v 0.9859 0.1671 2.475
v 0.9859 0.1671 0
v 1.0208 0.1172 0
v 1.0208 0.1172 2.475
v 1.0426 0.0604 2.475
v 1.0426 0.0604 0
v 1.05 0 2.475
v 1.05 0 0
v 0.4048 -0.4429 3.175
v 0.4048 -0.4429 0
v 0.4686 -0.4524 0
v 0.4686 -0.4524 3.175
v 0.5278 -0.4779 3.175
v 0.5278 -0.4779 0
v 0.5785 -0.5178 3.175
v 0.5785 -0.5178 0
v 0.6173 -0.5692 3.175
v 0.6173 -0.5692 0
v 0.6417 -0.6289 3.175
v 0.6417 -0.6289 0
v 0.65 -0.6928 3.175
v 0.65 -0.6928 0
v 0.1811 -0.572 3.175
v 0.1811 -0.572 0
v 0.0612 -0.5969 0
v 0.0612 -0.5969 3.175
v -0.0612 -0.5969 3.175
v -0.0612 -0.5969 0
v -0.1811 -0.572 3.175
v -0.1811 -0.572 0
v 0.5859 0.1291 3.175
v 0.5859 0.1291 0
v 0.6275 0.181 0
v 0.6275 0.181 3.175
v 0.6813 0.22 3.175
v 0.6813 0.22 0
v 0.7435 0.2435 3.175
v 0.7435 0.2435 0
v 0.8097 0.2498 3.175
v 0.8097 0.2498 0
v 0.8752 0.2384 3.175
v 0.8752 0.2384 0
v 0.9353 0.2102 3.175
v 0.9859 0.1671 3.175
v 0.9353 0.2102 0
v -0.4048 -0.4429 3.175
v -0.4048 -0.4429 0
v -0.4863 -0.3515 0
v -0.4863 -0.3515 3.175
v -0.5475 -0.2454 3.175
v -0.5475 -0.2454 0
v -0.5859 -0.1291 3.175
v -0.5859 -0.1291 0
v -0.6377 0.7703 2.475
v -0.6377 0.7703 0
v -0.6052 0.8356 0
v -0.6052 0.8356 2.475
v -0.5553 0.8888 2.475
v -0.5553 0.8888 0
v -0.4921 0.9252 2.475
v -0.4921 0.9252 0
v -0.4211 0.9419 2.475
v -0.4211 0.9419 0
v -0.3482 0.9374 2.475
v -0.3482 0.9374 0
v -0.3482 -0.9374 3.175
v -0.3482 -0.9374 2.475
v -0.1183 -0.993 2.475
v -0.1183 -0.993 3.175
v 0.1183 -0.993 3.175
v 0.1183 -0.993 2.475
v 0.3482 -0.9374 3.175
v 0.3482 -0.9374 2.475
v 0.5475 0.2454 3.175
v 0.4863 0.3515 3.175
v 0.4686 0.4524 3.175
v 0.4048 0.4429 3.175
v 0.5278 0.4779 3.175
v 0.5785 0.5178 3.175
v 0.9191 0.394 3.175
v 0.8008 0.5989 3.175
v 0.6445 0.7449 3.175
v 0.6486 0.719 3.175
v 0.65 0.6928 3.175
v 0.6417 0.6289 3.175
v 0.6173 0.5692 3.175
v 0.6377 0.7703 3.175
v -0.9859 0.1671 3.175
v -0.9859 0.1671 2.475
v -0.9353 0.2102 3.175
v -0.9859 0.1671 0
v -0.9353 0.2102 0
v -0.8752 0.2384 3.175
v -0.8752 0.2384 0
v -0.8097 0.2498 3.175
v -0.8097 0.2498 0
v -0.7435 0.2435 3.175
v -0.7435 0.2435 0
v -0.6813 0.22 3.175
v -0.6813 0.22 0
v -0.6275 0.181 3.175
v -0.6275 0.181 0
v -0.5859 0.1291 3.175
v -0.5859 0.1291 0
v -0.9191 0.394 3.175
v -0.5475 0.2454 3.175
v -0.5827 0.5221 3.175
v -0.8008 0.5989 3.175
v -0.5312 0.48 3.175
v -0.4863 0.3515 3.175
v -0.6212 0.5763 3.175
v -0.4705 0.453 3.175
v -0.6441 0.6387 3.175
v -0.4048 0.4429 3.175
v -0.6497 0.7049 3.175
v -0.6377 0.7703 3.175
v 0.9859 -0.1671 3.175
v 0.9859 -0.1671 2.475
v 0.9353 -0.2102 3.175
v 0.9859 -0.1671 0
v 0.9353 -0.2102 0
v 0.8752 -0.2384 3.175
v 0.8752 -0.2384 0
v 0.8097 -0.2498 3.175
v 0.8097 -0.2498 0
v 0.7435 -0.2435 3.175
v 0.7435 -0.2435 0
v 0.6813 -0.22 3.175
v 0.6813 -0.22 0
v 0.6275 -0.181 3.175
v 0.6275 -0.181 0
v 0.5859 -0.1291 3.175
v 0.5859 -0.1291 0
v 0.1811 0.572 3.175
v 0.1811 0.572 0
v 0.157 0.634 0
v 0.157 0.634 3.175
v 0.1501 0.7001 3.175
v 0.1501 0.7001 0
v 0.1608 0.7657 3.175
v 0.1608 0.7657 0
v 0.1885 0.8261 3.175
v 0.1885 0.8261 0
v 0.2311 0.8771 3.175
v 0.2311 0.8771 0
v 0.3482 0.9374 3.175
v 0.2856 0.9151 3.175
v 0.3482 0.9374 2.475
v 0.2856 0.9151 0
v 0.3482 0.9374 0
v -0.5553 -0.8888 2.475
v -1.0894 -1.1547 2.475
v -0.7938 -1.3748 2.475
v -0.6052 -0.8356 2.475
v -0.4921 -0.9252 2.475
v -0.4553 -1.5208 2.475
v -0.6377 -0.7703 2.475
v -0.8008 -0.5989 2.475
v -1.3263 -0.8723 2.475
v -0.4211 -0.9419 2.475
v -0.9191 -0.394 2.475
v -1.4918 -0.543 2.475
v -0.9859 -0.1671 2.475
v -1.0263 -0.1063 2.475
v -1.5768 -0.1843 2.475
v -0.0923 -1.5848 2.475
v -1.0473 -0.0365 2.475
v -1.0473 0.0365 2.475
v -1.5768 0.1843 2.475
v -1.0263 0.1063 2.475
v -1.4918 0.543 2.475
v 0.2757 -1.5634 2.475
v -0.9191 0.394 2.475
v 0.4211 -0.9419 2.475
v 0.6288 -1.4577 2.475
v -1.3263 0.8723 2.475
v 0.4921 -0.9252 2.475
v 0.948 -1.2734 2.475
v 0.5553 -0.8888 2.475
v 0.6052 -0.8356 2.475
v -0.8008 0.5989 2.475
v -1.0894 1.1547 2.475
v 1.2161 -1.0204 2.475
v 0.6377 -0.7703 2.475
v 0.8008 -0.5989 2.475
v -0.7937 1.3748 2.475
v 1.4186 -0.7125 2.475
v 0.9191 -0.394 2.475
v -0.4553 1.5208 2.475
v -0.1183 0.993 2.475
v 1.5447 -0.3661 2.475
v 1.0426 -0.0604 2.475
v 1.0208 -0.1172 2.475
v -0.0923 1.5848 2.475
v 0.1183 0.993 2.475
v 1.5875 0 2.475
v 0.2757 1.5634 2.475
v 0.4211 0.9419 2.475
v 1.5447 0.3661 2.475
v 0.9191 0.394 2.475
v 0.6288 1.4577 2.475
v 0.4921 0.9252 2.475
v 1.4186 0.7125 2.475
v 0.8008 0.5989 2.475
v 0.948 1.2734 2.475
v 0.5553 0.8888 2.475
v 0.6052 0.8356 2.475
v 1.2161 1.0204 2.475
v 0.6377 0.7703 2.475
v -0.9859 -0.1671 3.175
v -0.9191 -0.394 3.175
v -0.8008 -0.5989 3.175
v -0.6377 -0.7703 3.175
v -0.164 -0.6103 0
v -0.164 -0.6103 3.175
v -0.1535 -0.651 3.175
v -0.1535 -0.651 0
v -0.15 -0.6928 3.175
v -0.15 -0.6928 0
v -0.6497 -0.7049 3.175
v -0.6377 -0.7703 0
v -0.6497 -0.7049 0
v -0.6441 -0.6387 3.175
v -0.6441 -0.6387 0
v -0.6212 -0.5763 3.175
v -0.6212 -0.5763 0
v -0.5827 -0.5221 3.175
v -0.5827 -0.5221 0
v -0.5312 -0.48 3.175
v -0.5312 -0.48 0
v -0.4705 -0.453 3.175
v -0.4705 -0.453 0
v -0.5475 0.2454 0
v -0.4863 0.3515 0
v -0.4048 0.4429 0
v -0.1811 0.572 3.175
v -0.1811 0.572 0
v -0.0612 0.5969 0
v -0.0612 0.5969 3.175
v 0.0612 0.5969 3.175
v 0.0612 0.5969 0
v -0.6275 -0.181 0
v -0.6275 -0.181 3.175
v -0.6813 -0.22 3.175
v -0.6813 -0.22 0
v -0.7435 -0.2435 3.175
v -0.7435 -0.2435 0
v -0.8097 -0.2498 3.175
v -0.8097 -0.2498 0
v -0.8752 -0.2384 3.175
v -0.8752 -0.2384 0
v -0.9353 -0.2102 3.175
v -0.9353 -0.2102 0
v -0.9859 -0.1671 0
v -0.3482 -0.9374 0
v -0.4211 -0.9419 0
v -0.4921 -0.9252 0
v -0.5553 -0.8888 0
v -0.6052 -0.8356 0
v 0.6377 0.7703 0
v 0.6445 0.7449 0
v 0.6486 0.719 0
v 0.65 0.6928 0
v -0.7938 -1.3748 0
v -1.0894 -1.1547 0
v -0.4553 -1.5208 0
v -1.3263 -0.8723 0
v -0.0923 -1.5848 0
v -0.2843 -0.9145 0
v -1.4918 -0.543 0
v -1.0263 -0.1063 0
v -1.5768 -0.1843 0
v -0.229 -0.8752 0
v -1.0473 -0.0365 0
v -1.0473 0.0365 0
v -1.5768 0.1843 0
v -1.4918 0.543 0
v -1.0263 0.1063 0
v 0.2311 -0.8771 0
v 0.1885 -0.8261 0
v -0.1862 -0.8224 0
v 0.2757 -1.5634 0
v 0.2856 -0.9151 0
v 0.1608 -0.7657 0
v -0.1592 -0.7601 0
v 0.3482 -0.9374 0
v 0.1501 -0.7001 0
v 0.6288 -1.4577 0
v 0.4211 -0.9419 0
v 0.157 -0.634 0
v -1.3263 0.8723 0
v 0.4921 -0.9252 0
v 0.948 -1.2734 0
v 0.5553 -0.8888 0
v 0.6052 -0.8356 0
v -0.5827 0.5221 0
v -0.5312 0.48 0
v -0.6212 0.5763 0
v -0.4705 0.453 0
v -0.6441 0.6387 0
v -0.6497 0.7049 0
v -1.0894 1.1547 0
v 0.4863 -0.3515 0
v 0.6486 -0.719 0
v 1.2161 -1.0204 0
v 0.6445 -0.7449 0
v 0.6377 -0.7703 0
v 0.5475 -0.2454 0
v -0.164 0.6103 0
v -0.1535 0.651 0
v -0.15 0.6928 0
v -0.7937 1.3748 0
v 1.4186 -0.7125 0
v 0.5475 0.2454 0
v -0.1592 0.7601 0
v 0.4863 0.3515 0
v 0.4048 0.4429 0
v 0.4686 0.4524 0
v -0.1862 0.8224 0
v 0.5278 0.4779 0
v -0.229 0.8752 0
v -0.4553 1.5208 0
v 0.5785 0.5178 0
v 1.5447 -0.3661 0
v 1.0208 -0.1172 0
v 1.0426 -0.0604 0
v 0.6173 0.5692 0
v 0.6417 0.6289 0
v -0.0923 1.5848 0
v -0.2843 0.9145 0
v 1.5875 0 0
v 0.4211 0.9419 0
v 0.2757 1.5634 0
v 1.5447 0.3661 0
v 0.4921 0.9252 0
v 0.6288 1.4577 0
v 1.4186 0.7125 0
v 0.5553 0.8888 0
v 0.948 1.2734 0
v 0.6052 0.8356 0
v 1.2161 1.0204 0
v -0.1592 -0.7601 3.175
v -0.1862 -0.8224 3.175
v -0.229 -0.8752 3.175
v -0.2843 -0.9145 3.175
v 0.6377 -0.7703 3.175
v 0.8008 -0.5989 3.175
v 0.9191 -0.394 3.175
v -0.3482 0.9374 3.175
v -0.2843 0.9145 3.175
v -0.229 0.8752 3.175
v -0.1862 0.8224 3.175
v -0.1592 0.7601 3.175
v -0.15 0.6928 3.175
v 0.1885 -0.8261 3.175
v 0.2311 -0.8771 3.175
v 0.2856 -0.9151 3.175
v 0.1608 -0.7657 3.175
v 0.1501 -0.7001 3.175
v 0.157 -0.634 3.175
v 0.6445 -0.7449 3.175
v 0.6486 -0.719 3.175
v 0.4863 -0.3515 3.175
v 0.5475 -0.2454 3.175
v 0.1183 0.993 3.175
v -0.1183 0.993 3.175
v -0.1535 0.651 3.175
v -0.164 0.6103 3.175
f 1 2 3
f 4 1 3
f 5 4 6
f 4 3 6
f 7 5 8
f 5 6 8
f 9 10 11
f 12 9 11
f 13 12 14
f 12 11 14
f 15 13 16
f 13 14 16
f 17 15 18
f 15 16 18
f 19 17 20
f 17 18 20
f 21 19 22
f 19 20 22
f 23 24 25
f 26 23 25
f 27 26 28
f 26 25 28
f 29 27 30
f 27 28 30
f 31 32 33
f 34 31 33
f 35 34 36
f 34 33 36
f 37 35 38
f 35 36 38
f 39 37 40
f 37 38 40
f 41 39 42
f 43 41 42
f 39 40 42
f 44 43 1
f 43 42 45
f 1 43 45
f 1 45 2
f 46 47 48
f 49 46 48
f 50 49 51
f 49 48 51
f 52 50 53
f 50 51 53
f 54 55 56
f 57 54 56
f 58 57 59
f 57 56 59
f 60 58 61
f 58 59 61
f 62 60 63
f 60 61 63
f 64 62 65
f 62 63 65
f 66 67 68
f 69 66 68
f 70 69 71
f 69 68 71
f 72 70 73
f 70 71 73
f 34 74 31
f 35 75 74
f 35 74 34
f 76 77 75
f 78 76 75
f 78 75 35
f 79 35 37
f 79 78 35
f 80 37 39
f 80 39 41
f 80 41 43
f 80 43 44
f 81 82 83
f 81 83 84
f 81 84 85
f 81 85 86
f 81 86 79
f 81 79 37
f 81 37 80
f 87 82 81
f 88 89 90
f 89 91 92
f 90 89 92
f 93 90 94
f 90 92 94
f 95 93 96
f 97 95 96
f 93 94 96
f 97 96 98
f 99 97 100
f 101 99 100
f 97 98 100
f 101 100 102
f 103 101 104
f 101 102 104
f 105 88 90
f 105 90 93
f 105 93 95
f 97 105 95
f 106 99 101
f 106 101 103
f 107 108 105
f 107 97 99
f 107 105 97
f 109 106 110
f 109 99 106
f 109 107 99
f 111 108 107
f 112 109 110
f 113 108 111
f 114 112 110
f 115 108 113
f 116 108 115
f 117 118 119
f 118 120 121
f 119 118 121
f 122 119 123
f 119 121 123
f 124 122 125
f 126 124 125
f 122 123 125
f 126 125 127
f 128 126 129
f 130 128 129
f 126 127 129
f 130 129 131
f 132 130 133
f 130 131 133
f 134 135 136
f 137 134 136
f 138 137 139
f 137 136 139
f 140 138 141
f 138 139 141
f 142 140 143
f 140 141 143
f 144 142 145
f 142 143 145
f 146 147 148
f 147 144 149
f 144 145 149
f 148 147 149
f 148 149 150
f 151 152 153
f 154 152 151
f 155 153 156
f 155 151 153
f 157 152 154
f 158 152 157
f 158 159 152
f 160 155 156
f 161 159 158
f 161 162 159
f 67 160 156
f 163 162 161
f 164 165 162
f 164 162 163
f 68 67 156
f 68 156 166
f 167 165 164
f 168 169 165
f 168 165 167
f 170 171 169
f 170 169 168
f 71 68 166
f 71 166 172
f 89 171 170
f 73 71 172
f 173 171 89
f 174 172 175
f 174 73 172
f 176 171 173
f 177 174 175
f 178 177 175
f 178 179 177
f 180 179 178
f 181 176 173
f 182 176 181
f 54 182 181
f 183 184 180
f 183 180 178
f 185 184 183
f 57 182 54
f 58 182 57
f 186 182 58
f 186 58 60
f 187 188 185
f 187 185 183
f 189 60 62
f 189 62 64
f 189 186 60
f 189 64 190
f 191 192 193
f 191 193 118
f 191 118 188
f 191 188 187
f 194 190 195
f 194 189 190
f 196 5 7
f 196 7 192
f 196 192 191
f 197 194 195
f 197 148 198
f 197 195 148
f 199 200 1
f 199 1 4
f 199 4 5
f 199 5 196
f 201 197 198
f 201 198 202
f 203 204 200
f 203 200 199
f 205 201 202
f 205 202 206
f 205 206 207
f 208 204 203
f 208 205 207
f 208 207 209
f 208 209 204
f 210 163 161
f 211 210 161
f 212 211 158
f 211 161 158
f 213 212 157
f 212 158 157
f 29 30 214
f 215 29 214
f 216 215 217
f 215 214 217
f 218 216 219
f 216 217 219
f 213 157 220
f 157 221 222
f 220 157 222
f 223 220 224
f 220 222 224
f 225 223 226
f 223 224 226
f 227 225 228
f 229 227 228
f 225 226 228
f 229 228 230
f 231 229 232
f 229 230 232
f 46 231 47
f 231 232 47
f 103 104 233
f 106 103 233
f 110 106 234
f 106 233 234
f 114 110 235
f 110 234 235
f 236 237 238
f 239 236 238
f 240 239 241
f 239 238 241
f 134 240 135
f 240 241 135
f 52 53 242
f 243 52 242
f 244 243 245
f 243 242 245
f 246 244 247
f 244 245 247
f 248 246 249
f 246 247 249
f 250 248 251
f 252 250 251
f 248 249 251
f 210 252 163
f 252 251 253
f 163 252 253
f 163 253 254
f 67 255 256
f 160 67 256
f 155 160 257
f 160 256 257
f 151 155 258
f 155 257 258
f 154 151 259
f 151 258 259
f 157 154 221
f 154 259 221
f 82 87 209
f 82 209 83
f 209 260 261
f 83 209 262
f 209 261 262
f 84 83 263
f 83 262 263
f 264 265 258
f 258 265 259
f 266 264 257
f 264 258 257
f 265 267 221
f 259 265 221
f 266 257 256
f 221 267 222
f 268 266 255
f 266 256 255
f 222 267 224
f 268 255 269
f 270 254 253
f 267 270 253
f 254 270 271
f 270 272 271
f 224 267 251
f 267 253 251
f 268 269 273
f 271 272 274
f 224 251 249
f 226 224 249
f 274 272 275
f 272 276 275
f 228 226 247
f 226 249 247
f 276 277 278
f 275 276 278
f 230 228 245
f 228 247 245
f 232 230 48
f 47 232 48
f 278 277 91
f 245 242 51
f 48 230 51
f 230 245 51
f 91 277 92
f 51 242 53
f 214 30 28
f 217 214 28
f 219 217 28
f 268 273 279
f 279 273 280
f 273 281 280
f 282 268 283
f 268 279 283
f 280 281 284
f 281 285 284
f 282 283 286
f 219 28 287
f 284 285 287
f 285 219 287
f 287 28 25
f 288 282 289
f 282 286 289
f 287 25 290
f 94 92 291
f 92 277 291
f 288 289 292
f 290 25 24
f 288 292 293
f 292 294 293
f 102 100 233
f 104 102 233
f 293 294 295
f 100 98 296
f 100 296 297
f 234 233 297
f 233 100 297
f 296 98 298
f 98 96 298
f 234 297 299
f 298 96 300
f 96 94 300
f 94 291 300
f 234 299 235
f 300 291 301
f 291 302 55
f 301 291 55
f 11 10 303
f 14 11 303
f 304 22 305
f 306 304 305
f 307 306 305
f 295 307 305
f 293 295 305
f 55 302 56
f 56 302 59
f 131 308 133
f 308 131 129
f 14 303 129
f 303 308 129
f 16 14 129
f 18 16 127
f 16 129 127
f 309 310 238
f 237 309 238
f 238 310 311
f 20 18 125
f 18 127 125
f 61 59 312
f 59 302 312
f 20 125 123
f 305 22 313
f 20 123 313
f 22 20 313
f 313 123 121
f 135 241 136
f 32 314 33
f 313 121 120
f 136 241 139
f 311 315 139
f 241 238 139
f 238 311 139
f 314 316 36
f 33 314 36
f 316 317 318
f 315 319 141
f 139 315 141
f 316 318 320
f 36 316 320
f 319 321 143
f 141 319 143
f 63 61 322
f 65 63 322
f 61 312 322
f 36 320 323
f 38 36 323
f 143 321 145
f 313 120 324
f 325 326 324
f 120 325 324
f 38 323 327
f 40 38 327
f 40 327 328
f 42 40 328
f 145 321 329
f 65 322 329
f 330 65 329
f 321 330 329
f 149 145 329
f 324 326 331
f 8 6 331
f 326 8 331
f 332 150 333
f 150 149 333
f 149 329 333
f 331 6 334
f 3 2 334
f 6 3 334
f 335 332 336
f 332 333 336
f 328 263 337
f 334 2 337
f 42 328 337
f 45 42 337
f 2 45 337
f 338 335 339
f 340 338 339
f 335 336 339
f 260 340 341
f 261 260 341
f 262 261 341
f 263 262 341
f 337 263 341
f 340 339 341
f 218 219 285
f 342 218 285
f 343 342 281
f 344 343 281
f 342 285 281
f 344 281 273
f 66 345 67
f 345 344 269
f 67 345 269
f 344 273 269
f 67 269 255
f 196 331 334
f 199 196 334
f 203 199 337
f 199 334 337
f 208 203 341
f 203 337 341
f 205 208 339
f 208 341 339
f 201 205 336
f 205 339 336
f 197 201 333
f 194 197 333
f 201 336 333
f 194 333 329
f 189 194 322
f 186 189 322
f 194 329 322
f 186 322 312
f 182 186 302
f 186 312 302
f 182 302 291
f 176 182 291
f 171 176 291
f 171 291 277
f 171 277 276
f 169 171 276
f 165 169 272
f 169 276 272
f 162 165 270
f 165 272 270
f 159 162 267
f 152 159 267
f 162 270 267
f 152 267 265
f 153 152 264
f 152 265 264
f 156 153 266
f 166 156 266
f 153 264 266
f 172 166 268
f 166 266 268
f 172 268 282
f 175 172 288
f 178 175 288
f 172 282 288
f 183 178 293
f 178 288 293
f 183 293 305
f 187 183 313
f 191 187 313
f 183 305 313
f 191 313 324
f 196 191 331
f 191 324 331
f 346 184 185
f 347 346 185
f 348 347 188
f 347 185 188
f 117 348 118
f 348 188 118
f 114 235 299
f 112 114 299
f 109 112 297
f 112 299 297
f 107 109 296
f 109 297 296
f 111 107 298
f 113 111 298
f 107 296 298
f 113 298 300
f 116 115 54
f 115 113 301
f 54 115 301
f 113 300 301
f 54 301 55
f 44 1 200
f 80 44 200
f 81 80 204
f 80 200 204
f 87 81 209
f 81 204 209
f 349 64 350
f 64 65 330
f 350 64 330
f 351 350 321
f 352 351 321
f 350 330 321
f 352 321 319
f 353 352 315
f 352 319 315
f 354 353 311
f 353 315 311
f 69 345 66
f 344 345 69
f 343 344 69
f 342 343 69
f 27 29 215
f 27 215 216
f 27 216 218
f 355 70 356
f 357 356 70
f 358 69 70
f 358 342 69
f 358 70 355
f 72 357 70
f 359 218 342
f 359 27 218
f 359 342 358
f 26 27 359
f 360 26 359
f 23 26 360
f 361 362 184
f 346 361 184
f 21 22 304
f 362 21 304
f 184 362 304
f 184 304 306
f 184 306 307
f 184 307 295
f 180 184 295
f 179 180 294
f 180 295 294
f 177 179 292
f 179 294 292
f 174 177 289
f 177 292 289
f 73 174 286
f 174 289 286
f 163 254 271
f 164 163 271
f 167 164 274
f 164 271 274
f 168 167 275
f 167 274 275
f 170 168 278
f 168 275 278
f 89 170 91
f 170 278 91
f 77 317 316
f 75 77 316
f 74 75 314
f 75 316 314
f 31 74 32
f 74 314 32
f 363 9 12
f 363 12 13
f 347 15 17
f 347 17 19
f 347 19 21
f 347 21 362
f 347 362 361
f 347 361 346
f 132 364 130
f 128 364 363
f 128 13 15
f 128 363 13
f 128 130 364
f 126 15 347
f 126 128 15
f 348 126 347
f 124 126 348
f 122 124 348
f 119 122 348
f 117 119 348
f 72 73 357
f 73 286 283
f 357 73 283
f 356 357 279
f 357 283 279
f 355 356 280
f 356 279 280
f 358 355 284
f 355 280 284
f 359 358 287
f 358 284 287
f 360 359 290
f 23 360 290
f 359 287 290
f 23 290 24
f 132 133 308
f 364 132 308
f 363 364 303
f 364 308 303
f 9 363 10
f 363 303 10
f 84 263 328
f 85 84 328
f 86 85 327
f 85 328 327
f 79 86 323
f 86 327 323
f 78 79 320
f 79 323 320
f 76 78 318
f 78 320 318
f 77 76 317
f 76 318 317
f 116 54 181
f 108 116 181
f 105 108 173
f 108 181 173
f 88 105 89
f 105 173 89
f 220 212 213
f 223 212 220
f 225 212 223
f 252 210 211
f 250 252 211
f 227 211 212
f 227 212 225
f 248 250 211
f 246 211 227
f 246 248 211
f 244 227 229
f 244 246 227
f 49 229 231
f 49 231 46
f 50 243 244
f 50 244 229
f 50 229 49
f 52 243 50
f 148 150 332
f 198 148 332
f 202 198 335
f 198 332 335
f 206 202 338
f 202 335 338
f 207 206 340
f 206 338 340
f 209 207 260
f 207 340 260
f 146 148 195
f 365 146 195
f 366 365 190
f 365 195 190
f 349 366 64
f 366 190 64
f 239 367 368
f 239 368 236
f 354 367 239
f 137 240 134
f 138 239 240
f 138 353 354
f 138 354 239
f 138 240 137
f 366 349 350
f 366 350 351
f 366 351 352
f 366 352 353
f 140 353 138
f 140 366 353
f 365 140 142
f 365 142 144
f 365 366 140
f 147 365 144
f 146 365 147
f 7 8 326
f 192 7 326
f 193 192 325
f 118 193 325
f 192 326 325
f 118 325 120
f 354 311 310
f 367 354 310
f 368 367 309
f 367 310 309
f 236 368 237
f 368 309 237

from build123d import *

# Parameters (mm, degrees)
F1_DEPTH = 3.175
F0_R     = 1.5875
F2_DEPTH = 2.475


# Not quite as in the source:
# - a length typed as a fraction of an inch, garbled in the dataset ("3 / 203.2 mm" for 3/8 in), is restored


with BuildPart() as f1:
    # F0 (on Top) → F1 (new body)
    with BuildSketch(Plane.XY):
        with BuildLine():
            ThreePointArc((-0.5859375, 0.1291404123), (-0.5196152423, 0.3), (-0.4048076277, 0.4428665539))
            ThreePointArc((-0.4048076277, 0.4428665539), (-0.6037234698, 0.5479177769), (-0.6376941264, 0.7702896865))
            ThreePointArc((-0.6376941264, 0.7702896865), (-0.8660254038, 0.5), (-0.9859375, 0.16711447))
            ThreePointArc((-0.9859375, 0.16711447), (-0.7763724489, 0.2488809732), (-0.5859375, 0.1291404123))
        make_face()
    extrude(amount=F1_DEPTH)



with BuildPart() as f1b:
    # F0 (on Top) → F1, piece 2 (new body)
    with BuildSketch(Plane.XY):
        with BuildLine():
            ThreePointArc((-0.1811298723, 0.5720069662), (0, 0.6), (0.1811298723, 0.5720069662))
            ThreePointArc((0.1811298723, 0.5720069662), (0.1726489791, 0.7967987502), (0.3482433736, 0.9374041566))
            ThreePointArc((0.3482433736, 0.9374041566), (0, 1), (-0.3482433736, 0.9374041566))
            ThreePointArc((-0.3482433736, 0.9374041566), (-0.2057847115, 0.8502383071), (-0.15, 0.692820323))
            ThreePointArc((-0.15, 0.692820323), (-0.157907526, 0.6304405664), (-0.1811298723, 0.5720069662))
        make_face()
    extrude(amount=F1_DEPTH)


with BuildPart() as f1c:
    # F0 (on Top) → F1, piece 3 (new body)
    with BuildSketch(Plane.XY):
        with BuildLine():
            ThreePointArc((0.4048076277, 0.4428665539), (0.5196152423, 0.3), (0.5859375, 0.1291404123))
            ThreePointArc((0.5859375, 0.1291404123), (0.7763724489, 0.2488809732), (0.9859375, 0.16711447))
            ThreePointArc((0.9859375, 0.16711447), (0.8660254038, 0.5), (0.6376941264, 0.7702896865))
            ThreePointArc((0.6376941264, 0.7702896865), (0.6469043657, 0.732040652), (0.65, 0.692820323))
            ThreePointArc((0.65, 0.692820323), (0.5784683542, 0.5177516321), (0.4048076277, 0.4428665539))
        make_face()
    extrude(amount=F1_DEPTH)


with BuildPart() as f1d:
    # F0 (on Top) → F1, piece 4 (new body)
    with BuildSketch(Plane.XY):
        with BuildLine():
            ThreePointArc((0.9859375, -0.16711447), (0.7763724489, -0.2488809732), (0.5859375, -0.1291404123))
            ThreePointArc((0.5859375, -0.1291404123), (0.5196152423, -0.3), (0.4048076277, -0.4428665539))
            ThreePointArc((0.4048076277, -0.4428665539), (0.5784683542, -0.5177516321), (0.65, -0.692820323))
            ThreePointArc((0.65, -0.692820323), (0.6469043657, -0.732040652), (0.6376941264, -0.7702896865))
            ThreePointArc((0.6376941264, -0.7702896865), (0.8660254038, -0.5), (0.9859375, -0.16711447))
        make_face()
    extrude(amount=F1_DEPTH)


with BuildPart() as f1e:
    # F0 (on Top) → F1, piece 5 (new body)
    with BuildSketch(Plane.XY):
        with BuildLine():
            ThreePointArc((0.3482433736, -0.9374041566), (0.1726489791, -0.7967987502), (0.1811298723, -0.5720069662))
            ThreePointArc((0.1811298723, -0.5720069662), (0, -0.6), (-0.1811298723, -0.5720069662))
            ThreePointArc((-0.1811298723, -0.5720069662), (-0.157907526, -0.6304405664), (-0.15, -0.692820323))
            ThreePointArc((-0.15, -0.692820323), (-0.2057847115, -0.8502383071), (-0.3482433736, -0.9374041566))
            ThreePointArc((-0.3482433736, -0.9374041566), (0, -1), (0.3482433736, -0.9374041566))
        make_face()
    extrude(amount=F1_DEPTH)


with BuildPart() as f1f:
    # F0 (on Top) → F1, piece 6 (new body)
    with BuildSketch(Plane.XY):
        with BuildLine():
            ThreePointArc((-0.6376941264, -0.7702896865), (-0.6037234698, -0.5479177769), (-0.4048076277, -0.4428665539))
            ThreePointArc((-0.4048076277, -0.4428665539), (-0.5196152423, -0.3), (-0.5859375, -0.1291404123))
            ThreePointArc((-0.5859375, -0.1291404123), (-0.7763724489, -0.2488809732), (-0.9859375, -0.16711447))
            ThreePointArc((-0.9859375, -0.16711447), (-0.8660254038, -0.5), (-0.6376941264, -0.7702896865))
        make_face()
    extrude(amount=F1_DEPTH)


with BuildPart() as f1_1:
    add(f1.part)

    add(f1b.part)  # F2 merges F1b

    add(f1c.part)  # F2 merges F1c

    add(f1d.part)  # F2 merges F1d

    add(f1e.part)  # F2 merges F1e

    add(f1f.part)  # F2 merges F1f
    # F0 (on Top) → F2 (join)
    with BuildSketch(Plane.XY):
        Circle(F0_R)
        with BuildLine():
            ThreePointArc((0.6376941264, 0.7702896865), (0.8660254038, 0.5), (0.9859375, 0.16711447))
            ThreePointArc((0.9859375, 0.16711447), (1.0334356175, 0.0894863816), (1.05, 0))
            ThreePointArc((1.05, 0), (1.0334356175, -0.0894863816), (0.9859375, -0.16711447))
            ThreePointArc((0.9859375, -0.16711447), (0.8660254038, -0.5), (0.6376941264, -0.7702896865))
            ThreePointArc((0.6376941264, -0.7702896865), (0.525, -0.909326674), (0.3482433736, -0.9374041566))
            ThreePointArc((0.3482433736, -0.9374041566), (0, -1), (-0.3482433736, -0.9374041566))
            ThreePointArc((-0.3482433736, -0.9374041566), (-0.525, -0.909326674), (-0.6376941264, -0.7702896865))
            ThreePointArc((-0.6376941264, -0.7702896865), (-0.8660254038, -0.5), (-0.9859375, -0.16711447))
            ThreePointArc((-0.9859375, -0.16711447), (-1.05, 0), (-0.9859375, 0.16711447))
            ThreePointArc((-0.9859375, 0.16711447), (-0.8660254038, 0.5), (-0.6376941264, 0.7702896865))
            ThreePointArc((-0.6376941264, 0.7702896865), (-0.525, 0.909326674), (-0.3482433736, 0.9374041566))
            ThreePointArc((-0.3482433736, 0.9374041566), (0, 1), (0.3482433736, 0.9374041566))
            ThreePointArc((0.3482433736, 0.9374041566), (0.525, 0.909326674), (0.6376941264, 0.7702896865))
        make_face(mode=Mode.SUBTRACT)
    extrude(amount=F2_DEPTH)


solid = f1_1.part
